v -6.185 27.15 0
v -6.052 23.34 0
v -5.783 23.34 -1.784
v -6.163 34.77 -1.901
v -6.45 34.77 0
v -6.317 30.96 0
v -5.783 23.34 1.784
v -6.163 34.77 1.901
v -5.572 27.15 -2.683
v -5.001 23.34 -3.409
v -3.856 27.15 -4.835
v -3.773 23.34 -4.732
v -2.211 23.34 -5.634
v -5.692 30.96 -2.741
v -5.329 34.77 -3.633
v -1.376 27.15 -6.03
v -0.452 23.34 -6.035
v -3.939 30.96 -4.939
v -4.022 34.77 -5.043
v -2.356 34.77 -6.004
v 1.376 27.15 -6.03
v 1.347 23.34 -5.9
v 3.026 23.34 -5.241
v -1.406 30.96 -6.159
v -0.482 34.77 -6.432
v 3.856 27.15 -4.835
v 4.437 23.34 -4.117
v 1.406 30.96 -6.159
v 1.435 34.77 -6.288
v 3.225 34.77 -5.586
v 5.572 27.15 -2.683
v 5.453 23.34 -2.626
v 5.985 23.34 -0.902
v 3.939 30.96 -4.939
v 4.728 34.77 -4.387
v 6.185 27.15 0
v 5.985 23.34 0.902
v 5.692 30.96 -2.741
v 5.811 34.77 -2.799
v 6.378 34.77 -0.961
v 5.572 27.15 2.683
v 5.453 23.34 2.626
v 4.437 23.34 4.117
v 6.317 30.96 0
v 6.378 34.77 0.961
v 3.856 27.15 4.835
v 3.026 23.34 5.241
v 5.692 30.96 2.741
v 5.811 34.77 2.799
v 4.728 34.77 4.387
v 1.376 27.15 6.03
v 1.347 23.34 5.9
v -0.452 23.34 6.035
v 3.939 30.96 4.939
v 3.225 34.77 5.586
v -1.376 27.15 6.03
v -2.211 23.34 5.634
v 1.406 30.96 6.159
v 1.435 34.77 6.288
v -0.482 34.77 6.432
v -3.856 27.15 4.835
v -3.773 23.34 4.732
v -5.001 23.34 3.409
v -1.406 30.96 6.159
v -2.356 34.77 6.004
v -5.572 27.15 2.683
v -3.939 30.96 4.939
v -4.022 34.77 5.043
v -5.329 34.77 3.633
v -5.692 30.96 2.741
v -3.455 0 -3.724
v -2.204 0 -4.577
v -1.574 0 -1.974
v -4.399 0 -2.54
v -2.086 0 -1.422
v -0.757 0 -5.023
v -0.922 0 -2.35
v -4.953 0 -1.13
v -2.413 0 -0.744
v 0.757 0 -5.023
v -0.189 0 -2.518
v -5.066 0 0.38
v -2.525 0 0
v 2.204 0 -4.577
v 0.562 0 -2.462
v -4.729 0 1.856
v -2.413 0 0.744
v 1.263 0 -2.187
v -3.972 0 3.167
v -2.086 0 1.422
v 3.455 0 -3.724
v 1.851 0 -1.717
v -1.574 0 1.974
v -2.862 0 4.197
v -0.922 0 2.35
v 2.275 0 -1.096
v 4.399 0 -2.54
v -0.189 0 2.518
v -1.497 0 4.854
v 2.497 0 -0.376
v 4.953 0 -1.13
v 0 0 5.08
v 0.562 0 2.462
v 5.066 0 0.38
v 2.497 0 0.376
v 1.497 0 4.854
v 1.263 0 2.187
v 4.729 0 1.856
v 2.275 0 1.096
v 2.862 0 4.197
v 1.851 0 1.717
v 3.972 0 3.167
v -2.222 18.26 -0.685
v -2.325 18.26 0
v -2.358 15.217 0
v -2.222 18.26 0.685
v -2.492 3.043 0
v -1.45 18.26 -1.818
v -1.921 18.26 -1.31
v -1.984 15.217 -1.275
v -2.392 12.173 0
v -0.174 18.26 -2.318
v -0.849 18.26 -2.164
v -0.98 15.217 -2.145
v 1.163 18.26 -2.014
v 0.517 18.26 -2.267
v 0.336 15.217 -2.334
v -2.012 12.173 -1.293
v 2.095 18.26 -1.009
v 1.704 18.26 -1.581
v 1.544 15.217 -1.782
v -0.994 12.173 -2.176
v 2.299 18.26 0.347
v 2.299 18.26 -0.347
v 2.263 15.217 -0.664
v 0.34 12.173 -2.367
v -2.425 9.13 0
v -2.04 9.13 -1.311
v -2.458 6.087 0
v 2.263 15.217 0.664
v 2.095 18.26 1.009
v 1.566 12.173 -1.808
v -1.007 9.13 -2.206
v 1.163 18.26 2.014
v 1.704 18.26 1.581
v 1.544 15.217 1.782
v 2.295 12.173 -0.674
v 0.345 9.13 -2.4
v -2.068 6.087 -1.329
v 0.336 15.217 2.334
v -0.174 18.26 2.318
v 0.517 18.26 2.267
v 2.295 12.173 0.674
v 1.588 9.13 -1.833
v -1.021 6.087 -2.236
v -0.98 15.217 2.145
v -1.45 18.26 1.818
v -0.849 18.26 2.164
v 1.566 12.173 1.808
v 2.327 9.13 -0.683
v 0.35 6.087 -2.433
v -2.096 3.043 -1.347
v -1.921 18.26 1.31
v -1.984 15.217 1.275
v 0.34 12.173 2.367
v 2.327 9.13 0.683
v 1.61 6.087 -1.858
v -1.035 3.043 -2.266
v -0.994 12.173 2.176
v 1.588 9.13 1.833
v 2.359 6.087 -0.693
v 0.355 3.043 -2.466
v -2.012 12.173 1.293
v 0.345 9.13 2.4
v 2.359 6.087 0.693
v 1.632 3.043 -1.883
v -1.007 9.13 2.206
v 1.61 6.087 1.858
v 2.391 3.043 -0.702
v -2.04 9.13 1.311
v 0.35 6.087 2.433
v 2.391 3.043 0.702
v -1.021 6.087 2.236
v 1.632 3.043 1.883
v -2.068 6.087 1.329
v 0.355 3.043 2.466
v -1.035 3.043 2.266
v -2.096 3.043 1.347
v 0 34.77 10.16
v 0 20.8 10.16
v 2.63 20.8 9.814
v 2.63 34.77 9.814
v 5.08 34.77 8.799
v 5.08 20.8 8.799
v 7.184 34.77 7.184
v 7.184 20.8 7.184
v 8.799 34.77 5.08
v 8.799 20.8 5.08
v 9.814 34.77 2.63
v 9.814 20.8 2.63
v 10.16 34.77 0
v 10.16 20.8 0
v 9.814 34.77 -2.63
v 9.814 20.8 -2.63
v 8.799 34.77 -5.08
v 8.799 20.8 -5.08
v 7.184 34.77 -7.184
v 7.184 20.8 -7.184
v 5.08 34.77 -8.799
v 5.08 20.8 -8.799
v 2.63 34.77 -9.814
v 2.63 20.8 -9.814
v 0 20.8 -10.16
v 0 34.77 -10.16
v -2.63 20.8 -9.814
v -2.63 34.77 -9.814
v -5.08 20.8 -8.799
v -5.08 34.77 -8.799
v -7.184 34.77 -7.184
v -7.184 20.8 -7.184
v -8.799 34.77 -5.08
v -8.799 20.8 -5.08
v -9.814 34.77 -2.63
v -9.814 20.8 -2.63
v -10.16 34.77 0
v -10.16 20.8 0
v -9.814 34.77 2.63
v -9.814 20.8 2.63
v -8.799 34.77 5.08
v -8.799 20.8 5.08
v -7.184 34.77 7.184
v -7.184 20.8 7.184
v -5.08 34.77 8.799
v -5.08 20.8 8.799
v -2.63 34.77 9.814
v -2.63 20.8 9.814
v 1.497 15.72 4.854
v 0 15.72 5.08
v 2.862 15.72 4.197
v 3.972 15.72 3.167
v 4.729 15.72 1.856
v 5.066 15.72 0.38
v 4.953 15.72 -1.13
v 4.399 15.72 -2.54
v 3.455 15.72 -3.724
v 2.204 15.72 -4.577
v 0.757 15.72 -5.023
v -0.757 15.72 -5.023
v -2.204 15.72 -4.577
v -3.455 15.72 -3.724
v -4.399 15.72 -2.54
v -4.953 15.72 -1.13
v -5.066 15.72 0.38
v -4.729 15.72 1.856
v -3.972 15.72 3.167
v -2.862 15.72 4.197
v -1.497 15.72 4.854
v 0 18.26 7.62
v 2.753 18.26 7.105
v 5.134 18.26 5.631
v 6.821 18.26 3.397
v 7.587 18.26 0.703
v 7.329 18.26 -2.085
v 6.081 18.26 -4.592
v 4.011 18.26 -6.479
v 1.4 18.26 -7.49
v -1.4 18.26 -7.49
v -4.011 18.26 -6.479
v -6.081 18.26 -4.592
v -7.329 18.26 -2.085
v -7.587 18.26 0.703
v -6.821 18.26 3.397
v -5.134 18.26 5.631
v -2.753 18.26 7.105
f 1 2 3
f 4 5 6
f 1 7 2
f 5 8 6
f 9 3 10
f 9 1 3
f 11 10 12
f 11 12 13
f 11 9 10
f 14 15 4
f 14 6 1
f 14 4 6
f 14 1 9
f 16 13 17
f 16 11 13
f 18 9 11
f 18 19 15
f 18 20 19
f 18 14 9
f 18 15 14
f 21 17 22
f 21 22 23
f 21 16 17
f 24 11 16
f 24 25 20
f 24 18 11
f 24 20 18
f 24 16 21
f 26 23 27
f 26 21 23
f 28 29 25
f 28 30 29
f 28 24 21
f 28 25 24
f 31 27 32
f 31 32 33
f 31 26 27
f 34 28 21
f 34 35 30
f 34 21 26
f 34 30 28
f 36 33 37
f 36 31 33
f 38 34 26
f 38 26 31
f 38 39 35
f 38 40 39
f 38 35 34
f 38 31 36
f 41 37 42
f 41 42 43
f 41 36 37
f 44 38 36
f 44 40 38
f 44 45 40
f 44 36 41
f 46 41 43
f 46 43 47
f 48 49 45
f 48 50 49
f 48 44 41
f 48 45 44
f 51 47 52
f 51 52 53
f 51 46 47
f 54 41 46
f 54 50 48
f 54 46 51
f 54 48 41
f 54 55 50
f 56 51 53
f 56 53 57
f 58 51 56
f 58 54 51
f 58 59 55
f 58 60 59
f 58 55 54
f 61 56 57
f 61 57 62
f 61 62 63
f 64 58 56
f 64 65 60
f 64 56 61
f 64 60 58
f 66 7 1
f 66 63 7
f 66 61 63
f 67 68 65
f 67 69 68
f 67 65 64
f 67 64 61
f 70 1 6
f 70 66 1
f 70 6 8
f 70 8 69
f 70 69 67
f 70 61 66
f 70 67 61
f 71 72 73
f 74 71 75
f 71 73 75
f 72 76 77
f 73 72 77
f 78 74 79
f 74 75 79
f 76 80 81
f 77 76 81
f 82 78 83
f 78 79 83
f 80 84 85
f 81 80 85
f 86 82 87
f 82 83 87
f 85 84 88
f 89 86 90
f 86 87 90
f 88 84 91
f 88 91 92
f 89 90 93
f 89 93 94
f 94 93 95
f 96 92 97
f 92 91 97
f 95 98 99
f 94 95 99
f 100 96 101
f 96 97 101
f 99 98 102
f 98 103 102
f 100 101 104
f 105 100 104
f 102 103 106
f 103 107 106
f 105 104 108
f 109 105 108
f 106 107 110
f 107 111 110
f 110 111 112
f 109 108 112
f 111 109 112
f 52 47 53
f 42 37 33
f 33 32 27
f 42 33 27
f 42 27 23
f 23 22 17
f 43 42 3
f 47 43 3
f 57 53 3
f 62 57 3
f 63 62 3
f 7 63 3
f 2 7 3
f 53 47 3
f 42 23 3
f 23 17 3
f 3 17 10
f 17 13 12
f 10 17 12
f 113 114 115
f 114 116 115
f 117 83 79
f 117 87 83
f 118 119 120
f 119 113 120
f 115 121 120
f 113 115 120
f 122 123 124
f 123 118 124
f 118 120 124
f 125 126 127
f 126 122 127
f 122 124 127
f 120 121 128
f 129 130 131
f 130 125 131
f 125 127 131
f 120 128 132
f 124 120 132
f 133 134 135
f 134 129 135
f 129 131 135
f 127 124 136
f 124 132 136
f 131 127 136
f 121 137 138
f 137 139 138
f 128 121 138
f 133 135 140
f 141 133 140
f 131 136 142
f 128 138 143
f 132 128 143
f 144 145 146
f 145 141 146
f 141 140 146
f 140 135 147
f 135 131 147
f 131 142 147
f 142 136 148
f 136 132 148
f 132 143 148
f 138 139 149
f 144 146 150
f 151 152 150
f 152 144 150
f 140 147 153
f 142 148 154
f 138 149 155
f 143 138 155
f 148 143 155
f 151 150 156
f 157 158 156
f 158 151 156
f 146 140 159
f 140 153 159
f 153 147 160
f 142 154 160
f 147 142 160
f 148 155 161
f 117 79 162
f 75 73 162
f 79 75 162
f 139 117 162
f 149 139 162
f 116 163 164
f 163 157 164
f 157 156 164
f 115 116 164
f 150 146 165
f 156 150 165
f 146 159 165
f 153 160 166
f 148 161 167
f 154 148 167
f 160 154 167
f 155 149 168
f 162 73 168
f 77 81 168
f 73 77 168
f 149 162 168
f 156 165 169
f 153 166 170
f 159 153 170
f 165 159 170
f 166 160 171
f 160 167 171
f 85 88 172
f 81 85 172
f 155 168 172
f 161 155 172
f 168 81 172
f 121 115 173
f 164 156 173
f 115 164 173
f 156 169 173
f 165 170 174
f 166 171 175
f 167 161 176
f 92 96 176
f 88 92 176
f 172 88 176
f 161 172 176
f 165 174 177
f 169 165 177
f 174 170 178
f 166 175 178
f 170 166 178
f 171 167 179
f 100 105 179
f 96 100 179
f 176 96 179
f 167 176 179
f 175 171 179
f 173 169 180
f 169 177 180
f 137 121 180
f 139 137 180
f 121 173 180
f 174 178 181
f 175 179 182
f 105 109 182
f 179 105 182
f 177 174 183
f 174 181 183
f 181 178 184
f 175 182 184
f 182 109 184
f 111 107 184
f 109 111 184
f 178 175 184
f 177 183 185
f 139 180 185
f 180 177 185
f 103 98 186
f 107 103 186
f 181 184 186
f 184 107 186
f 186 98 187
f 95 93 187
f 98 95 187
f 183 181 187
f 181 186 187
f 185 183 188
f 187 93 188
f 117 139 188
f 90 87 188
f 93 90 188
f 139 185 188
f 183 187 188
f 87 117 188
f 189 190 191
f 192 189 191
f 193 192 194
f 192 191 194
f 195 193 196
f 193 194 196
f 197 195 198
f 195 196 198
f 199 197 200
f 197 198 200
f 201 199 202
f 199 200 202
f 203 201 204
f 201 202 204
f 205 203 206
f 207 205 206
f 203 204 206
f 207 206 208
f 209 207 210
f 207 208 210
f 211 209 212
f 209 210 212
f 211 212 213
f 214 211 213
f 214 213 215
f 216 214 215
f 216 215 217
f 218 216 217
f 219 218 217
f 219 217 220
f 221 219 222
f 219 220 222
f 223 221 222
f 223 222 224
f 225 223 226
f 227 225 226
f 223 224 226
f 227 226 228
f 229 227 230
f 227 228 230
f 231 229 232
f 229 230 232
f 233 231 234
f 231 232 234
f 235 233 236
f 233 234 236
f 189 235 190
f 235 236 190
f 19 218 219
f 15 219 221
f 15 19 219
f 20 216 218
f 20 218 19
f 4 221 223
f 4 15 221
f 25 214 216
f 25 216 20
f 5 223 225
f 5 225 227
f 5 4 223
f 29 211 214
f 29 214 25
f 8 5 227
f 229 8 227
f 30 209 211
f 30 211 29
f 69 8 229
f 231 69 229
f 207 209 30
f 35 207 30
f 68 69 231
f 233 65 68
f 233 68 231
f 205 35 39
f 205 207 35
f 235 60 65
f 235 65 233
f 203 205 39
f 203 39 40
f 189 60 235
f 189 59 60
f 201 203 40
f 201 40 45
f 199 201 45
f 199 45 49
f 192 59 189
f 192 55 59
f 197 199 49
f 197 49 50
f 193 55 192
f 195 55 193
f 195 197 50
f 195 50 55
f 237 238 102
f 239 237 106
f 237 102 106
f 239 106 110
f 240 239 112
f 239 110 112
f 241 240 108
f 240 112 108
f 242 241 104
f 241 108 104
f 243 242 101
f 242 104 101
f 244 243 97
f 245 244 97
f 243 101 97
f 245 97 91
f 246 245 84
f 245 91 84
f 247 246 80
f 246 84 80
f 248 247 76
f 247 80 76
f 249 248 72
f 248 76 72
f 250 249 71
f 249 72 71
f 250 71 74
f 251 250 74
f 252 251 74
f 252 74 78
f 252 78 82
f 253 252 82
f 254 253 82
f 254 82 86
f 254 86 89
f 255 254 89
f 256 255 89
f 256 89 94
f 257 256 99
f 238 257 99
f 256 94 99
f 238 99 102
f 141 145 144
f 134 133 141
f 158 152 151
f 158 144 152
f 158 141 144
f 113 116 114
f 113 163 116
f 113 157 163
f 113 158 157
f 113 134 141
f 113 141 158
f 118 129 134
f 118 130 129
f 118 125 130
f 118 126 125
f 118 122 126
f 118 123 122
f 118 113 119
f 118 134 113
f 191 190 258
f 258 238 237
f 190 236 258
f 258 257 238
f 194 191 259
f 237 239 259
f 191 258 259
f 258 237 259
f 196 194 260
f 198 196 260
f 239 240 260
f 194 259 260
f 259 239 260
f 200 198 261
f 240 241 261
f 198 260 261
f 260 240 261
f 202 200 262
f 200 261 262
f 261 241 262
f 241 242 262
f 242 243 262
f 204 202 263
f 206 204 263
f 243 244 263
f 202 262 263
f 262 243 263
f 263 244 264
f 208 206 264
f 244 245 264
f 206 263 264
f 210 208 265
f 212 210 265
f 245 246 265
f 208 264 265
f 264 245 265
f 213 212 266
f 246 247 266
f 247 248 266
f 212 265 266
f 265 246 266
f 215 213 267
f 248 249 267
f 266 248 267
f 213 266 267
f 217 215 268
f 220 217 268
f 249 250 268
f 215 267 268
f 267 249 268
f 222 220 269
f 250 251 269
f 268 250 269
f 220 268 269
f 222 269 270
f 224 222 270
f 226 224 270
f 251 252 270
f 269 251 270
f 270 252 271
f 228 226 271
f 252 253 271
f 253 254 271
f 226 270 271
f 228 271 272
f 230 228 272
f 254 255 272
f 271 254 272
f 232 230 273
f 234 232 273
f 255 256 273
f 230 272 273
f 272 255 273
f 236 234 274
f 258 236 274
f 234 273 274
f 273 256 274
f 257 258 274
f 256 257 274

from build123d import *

# Parameters (mm, degrees)
SKETCH1_R           = 5.08
BOSS_EXTRUDE1_DEPTH = 20.8
SKETCH2_R           = 10.16
BOSS_EXTRUDE2_DEPTH = 13.97
SKETCH4_R           = 6.052157879
SKETCH3_R           = 6.450000054
CHAMFER1_SIZE       = 5.08
SKETCH6_R           = 2.325
SKETCH5_R           = 2.525


with BuildPart() as part:
    # Sketch1 → Boss-Extrude1 (new body)
    with BuildSketch(Plane(origin=(0, 0, 0), x_dir=(1, 0, 0), z_dir=(0, 1, 0))):
        with Locations(Location((0, 0, 0), (0, 0, 270))):
            Circle(SKETCH1_R)
    extrude(amount=BOSS_EXTRUDE1_DEPTH)

    # Sketch2 → Boss-Extrude2 (add)
    with BuildSketch(Plane(origin=(0, 20.8, 0), x_dir=(1, 0, 0), z_dir=(0, 1, 0))):
        with Locations(Location((0, 0, 0), (0, 0, 270))):
            Circle(SKETCH2_R)
    extrude(amount=BOSS_EXTRUDE2_DEPTH)

    # Sketch4 → Cut-Loft1 section 0
    with BuildSketch(Plane(origin=(0, 23.34, 0), x_dir=(-1, 0, 0), z_dir=(0, -1, 0))):
        Circle(SKETCH4_R)
    # Sketch3 → Cut-Loft1 section 1
    with BuildSketch(Plane(origin=(0, 34.77, 0), x_dir=(1, 0, 0), z_dir=(0, 1, 0))):
        Circle(SKETCH3_R)
    loft(mode=Mode.SUBTRACT)

    # Chamfer1
    chamfer1_edges = [part.edges().sort_by_distance(p)[0] for p in [
        (0, 20.8, -5.08),
    ]]
    chamfer(chamfer1_edges, length=CHAMFER1_SIZE - 0.0001)  # a hair under: the kernel refuses the full size

    # Sketch6 → Cut-Loft2 section 0
    with BuildSketch(Plane(origin=(0, 18.26, 0), x_dir=(-1, 0, 0), z_dir=(0, -1, 0))):
        Circle(SKETCH6_R)
    # Sketch5 → Cut-Loft2 section 1
    with BuildSketch(Plane.XZ):
        Circle(SKETCH5_R)
    loft(mode=Mode.SUBTRACT)


solid = part.part
